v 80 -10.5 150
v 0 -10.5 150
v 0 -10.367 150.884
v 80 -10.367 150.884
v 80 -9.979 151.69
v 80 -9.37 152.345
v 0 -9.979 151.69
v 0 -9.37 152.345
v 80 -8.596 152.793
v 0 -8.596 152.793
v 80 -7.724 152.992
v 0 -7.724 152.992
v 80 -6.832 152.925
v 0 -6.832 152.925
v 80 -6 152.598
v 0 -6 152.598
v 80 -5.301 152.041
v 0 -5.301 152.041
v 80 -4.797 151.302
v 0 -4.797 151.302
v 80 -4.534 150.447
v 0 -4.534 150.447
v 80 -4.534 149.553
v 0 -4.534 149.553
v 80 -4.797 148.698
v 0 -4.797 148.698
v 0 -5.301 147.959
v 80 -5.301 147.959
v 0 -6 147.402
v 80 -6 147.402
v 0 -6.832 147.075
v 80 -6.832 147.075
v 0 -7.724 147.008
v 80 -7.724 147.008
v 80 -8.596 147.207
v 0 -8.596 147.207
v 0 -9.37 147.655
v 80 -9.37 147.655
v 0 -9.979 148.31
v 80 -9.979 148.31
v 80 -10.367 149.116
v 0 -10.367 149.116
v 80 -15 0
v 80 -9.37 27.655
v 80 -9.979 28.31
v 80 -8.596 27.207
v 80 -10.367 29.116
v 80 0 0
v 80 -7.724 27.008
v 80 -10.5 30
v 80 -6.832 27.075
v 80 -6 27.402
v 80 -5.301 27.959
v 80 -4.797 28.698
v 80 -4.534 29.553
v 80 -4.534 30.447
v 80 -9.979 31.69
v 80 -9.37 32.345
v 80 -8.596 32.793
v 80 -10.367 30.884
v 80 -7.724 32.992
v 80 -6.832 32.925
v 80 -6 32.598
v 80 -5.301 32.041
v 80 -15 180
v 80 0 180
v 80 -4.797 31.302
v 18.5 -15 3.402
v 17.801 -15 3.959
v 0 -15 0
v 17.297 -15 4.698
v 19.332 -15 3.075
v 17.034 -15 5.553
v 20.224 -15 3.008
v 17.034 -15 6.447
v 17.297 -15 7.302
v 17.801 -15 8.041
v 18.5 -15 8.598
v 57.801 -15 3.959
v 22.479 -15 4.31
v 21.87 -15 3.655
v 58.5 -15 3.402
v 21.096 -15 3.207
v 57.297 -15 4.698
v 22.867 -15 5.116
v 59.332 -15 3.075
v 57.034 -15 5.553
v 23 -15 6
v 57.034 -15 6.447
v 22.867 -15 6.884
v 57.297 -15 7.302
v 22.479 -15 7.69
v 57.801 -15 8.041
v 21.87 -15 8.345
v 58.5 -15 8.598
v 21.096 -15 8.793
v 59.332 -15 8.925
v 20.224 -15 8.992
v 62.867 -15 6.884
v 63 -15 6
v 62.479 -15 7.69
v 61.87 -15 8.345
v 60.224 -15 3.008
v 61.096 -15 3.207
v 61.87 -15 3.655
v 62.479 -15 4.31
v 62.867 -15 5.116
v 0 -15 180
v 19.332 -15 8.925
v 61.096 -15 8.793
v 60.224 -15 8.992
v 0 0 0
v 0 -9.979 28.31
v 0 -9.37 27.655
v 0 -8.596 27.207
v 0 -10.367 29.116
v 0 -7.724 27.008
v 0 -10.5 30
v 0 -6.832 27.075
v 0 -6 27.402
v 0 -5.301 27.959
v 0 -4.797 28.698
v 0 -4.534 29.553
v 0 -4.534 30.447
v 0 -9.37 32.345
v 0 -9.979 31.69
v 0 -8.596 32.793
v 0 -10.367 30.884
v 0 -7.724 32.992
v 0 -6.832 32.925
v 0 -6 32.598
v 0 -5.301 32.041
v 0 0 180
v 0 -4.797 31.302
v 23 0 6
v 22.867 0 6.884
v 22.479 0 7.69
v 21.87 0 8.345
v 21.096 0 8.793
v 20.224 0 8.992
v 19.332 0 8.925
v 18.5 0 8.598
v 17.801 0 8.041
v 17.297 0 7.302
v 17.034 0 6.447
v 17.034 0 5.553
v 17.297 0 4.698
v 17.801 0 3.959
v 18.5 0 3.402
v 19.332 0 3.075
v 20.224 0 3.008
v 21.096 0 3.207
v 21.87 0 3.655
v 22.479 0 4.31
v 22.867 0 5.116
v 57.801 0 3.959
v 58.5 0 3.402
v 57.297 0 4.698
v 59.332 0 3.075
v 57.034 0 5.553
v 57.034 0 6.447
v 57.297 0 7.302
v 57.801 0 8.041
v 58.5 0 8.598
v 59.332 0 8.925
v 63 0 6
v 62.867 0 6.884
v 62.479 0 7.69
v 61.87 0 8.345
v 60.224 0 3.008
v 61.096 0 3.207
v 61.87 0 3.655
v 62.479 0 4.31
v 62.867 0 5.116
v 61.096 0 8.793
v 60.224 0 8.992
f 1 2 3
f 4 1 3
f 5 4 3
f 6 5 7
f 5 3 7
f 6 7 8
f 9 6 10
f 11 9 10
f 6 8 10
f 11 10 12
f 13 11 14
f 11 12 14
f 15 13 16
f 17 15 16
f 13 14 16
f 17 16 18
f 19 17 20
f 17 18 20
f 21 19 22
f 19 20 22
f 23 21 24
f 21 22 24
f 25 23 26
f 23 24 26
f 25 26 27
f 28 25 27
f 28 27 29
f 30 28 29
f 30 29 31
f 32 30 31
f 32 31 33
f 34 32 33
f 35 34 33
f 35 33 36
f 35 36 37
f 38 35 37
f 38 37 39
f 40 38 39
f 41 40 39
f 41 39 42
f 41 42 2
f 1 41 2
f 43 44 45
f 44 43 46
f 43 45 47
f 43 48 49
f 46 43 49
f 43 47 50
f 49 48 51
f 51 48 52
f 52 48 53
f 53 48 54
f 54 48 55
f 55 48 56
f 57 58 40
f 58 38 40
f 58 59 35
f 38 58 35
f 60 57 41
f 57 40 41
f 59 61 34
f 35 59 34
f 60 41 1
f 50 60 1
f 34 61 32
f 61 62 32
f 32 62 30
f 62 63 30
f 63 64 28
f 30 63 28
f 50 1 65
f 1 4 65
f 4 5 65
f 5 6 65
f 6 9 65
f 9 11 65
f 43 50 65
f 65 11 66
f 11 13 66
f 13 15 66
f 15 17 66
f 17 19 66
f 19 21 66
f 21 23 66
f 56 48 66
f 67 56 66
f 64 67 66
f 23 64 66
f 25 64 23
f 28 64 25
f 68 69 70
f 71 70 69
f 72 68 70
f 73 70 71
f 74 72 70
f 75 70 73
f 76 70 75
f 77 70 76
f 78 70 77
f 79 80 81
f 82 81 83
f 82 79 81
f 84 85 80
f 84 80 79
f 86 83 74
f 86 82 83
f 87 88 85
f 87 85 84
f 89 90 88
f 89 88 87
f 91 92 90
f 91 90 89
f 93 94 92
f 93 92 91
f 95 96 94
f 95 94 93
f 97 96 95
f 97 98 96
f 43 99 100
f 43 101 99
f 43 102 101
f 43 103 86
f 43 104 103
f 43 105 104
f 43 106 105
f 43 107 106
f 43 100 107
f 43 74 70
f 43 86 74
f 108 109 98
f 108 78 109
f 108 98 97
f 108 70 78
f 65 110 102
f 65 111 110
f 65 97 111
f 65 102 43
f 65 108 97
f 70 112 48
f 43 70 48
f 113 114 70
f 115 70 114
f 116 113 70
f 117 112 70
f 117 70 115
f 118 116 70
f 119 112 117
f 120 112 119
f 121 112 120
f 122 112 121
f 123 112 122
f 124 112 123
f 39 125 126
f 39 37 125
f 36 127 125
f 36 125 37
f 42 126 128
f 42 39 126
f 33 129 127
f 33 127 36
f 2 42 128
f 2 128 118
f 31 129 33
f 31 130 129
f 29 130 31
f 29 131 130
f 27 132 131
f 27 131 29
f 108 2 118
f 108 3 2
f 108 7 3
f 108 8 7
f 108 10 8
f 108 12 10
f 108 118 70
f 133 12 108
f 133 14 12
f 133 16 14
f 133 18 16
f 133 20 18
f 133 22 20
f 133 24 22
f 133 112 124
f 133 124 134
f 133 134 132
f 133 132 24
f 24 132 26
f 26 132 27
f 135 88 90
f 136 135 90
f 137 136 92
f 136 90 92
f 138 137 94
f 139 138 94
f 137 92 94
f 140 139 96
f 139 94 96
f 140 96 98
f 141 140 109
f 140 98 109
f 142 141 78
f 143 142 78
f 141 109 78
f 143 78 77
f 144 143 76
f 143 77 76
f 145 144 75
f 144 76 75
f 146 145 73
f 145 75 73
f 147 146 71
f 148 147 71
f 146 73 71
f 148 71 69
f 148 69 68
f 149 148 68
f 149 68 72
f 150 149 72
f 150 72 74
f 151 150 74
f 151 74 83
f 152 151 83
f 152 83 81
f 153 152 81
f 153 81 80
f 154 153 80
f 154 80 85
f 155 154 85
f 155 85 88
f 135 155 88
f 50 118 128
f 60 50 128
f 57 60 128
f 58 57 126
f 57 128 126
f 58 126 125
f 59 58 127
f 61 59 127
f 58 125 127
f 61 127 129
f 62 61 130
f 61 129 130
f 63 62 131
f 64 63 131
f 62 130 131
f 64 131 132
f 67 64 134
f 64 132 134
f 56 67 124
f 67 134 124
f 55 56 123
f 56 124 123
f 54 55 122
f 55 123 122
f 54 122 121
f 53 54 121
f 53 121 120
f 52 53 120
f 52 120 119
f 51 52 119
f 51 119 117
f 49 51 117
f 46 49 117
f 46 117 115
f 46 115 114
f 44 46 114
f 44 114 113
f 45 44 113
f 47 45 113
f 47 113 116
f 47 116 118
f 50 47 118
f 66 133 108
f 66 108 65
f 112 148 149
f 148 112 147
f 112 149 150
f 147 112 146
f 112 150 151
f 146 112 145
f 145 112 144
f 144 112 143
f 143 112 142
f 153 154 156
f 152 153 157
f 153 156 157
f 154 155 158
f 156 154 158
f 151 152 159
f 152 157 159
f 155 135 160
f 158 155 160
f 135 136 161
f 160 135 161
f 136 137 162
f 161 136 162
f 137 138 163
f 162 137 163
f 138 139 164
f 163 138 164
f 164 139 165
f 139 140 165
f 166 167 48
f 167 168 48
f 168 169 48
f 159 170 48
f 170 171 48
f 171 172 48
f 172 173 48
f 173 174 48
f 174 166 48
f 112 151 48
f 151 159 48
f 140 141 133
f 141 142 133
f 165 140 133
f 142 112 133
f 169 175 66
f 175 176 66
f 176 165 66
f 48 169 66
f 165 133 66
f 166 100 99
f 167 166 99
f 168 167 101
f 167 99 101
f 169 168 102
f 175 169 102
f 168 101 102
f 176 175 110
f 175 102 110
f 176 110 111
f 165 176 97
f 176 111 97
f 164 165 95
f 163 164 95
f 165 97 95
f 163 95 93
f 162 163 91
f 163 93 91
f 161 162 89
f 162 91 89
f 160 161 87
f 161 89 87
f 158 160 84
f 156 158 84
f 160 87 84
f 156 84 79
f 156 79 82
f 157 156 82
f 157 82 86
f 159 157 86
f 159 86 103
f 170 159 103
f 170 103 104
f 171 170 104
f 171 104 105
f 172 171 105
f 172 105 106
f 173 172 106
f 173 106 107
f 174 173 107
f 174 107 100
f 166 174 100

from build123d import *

# Parameters (mm, degrees)
F0_W     = 80
F0_H     = 180
F1_DEPTH = 15
F2_R     = 3
F3_DEPTH = 15.001
F4_R     = 3
F5_DEPTH = 80.001


with BuildPart() as f1:
    # F0 (on Front) → F1 (new body)
    with BuildSketch(Plane.XZ):
        with Locations((40, 90)):
            Rectangle(F0_W, F0_H)
    extrude(amount=F1_DEPTH)

    # F2 (on face) → F3 (cut, through all)
    with BuildSketch(Plane.XZ.offset(15)):
        with Locations((60, 6)):
            Circle(F2_R)
        with Locations((20, 6)):
            Circle(F2_R)
    extrude(amount=-F3_DEPTH, mode=Mode.SUBTRACT)

    # F4 (on face) → F5 (cut, through all)
    with BuildSketch(Plane(origin=(0, 0, 0), x_dir=(0, -1, 0), z_dir=(-1, 0, 0))):
        with Locations((7.5, 30)):
            Circle(F4_R)
        with Locations((7.5, 150)):
            Circle(F4_R)
    extrude(amount=-F5_DEPTH, mode=Mode.SUBTRACT)


solid = f1.part
